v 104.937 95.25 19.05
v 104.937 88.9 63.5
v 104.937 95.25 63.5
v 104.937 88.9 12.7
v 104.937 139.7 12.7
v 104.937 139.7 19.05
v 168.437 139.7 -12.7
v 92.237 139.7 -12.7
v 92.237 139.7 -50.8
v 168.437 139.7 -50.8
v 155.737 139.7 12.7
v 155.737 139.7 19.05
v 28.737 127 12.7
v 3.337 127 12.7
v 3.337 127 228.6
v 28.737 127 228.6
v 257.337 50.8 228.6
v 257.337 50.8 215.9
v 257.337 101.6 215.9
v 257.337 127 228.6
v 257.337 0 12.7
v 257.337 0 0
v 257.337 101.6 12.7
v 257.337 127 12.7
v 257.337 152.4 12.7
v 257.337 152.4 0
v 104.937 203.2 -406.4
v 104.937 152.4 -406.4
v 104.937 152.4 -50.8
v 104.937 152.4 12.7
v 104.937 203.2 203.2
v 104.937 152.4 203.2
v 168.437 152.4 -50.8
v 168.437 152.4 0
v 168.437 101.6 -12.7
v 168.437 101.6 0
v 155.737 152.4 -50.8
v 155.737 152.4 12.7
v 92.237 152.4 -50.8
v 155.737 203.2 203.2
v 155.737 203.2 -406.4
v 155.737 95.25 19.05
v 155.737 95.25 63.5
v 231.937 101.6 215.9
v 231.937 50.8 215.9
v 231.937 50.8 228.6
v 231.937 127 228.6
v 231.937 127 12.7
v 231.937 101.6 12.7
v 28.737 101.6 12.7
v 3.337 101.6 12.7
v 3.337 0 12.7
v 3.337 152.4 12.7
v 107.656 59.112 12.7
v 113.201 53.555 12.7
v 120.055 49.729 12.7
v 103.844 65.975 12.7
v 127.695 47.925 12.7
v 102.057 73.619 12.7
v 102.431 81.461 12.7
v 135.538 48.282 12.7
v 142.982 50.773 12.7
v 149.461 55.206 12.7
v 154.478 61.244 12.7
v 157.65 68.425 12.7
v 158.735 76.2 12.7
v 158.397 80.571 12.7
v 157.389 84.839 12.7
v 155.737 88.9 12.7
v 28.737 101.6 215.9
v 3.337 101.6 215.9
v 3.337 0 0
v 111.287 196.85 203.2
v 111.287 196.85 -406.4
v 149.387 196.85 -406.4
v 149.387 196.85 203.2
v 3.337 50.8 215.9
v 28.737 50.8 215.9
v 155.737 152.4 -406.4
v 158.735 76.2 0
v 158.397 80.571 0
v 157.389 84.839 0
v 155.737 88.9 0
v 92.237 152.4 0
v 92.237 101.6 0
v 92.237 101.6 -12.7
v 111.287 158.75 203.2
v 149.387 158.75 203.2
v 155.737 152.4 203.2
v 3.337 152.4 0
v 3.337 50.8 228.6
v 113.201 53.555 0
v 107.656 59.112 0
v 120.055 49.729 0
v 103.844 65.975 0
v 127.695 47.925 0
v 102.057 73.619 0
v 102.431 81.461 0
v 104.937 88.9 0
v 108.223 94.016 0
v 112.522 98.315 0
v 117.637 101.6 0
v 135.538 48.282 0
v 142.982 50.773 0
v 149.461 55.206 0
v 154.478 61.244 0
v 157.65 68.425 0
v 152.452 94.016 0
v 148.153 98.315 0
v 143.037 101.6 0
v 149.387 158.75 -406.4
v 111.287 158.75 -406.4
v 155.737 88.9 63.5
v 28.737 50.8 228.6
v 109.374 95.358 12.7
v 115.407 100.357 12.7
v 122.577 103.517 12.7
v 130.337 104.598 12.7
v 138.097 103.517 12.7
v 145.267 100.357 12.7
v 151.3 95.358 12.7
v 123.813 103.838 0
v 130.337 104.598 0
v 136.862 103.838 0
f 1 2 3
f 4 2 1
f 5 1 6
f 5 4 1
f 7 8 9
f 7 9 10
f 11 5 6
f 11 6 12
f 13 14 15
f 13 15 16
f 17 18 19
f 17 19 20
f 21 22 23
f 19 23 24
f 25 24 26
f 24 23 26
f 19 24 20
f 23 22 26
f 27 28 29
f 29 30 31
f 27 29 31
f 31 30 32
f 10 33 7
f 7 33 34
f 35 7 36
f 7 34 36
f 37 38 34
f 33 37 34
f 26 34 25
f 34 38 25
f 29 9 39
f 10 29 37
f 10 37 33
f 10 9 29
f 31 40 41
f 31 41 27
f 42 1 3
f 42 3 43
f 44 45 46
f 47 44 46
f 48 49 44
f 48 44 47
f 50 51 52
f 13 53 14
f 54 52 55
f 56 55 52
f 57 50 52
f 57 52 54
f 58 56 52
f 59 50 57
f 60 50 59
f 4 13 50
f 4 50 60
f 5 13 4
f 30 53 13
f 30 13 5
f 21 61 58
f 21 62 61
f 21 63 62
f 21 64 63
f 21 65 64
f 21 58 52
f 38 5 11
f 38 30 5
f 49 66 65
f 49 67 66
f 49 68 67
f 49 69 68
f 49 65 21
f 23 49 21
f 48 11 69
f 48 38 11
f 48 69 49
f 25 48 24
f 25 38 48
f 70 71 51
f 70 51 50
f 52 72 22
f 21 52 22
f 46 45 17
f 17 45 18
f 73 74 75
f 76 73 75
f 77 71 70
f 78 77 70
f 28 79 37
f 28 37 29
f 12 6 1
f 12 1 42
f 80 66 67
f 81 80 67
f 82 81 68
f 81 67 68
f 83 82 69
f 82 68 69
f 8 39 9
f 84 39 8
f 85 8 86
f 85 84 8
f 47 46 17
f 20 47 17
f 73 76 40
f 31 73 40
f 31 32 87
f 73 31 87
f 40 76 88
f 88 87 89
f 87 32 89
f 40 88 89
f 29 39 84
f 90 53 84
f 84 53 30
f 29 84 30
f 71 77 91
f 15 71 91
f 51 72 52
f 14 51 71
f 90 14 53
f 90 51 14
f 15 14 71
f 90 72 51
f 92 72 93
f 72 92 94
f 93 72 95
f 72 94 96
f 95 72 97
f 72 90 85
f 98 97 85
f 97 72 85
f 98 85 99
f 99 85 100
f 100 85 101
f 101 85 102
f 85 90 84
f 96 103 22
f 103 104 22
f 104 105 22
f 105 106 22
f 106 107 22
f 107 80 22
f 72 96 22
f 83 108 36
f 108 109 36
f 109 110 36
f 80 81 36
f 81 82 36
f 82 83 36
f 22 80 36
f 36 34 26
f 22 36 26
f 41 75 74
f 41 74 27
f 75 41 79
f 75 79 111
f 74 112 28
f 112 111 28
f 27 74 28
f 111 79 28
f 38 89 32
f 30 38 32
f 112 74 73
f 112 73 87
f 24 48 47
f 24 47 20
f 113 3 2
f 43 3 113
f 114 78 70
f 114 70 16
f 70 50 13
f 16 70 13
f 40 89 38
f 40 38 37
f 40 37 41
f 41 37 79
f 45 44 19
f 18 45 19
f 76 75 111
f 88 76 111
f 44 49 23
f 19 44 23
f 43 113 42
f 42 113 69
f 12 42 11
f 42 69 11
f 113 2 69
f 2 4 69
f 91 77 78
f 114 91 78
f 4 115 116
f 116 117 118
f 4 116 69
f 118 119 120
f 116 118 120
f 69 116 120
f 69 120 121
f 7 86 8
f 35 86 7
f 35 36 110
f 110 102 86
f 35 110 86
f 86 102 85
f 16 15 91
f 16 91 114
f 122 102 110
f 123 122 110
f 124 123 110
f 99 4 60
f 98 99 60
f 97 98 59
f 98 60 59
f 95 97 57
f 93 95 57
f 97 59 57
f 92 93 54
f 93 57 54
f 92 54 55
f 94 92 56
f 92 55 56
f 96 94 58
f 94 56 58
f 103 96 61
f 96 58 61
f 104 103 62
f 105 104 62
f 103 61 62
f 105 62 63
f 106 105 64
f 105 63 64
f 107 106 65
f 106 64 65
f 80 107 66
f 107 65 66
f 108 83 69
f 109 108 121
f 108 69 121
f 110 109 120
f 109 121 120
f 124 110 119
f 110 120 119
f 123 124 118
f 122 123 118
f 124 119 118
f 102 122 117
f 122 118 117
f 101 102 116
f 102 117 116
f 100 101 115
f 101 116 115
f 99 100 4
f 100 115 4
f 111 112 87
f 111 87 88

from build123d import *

# Parameters (mm, degrees)
F0_W      = 254
F0_H      = 152.4
F1_DEPTH  = 12.7
F2_W      = 50.8
F2_H      = 50.8
F3_DEPTH  = 6.35
F4_W      = 50.8
F4_H      = 6.35
F5_DEPTH  = 44.45
F7_DEPTH  = 25.4
F9_DEPTH  = 12.7
F10_W     = 76.2
F10_H     = 12.7
F11_DEPTH = 38.1
F13_DEPTH = 50.8
F14_W     = 38.1
F14_H     = 38.1
F15_DEPTH = 647.7
F16_W     = 25.4
F16_H     = 25.4
F17_DEPTH = 203.2
F18_W     = 25.4
F18_H     = 76.2
F19_DEPTH = 12.7
F20_W     = 25.4
F20_H     = 76.2
F21_DEPTH = 12.7


with BuildPart() as f1:
    # F0 (on Top) → F1 (new body)
    with BuildSketch(Plane.XY):
        with Locations((130.337225, 76.2)):
            Rectangle(F0_W, F0_H)
    extrude(amount=F1_DEPTH)

    # F2 (on face) → F3 (join)
    with BuildSketch(Plane.XY.offset(12.7)):
        with Locations((130.337225, 114.3)):
            Rectangle(F2_W, F2_H)
    extrude(amount=F3_DEPTH)

    # F4 (on face) → F5 (join)
    with BuildSketch(Plane.XY.offset(19.05)):
        with Locations((130.337225, 92.075)):
            Rectangle(F4_W, F4_H)
    extrude(amount=F5_DEPTH)

    # F6 (on face) → F7 (cut)
    with BuildSketch(Plane.XY.offset(12.7)):
        with BuildLine():
            ThreePointArc((158.735288, 76.2), (157.975611, 82.724538), (155.737225, 88.9))
            Line((155.737225, 88.9), (104.937225, 88.9))
            ThreePointArc((104.937225, 88.9), (123.812687, 48.561614), (158.735288, 76.2))
        make_face()
        with BuildLine():
            Line((104.937225, 88.9), (155.737225, 88.9))
            ThreePointArc((155.737225, 88.9), (130.337225, 104.598063), (104.937225, 88.9))
        make_face()
    extrude(amount=-F7_DEPTH, mode=Mode.SUBTRACT)

    # F8 (on face) → F9 (join)
    with BuildSketch(Plane(origin=(0, 0, 0), x_dir=(1, 0, 0), z_dir=(0, 0, -1))):
        Polygon((92.237225, -152.4), (130.337225, -152.4), (168.437225, -152.4), (168.437225, -101.6), (92.237225, -101.6), align=None)
    extrude(amount=F9_DEPTH)

    # F10 (on face) → F11 (join)
    with BuildSketch(Plane(origin=(0, 0, -12.7), x_dir=(1, 0, 0), z_dir=(0, 0, -1))):
        with Locations((130.337225, -146.05)):
            Rectangle(F10_W, F10_H)
    extrude(amount=F11_DEPTH)

    # F12 (on face) → F13 (join)
    with BuildSketch(Plane(origin=(0, 152.4, 0), x_dir=(-1, 0, 0), z_dir=(0, 1, 0))):
        Polygon((-104.937225, 203.2), (-130.337225, 203.2), (-155.737225, 203.2), (-155.737225, -406.4), (-104.937225, -406.4), align=None)
    extrude(amount=F13_DEPTH)

    # F14 (on face) → F15 (cut)
    with BuildSketch(Plane(origin=(0, 0, -406.4), x_dir=(1, 0, 0), z_dir=(0, 0, -1))):
        with Locations((130.337225, -177.8)):
            Rectangle(F14_W, F14_H)
    extrude(amount=-F15_DEPTH, mode=Mode.SUBTRACT)

    # F16 (on face) → F17 (join)
    with BuildSketch(Plane.XY.offset(12.7)):
        with Locations((16.037225, 114.3)):
            Rectangle(F16_W, F16_H)
        with Locations((244.637225, 114.3)):
            Rectangle(F16_W, F16_H)
    extrude(amount=F17_DEPTH)

    # F18 (on face) → F19 (join)
    with BuildSketch(Plane.XY.offset(215.9)):
        with Locations((244.637225, 88.9)):
            Rectangle(F18_W, F18_H)
    extrude(amount=F19_DEPTH)

    # F20 (on face) → F21 (join)
    with BuildSketch(Plane.XY.offset(215.9)):
        with Locations((16.037225, 88.9)):
            Rectangle(F20_W, F20_H)
    extrude(amount=F21_DEPTH)


solid = f1.part
